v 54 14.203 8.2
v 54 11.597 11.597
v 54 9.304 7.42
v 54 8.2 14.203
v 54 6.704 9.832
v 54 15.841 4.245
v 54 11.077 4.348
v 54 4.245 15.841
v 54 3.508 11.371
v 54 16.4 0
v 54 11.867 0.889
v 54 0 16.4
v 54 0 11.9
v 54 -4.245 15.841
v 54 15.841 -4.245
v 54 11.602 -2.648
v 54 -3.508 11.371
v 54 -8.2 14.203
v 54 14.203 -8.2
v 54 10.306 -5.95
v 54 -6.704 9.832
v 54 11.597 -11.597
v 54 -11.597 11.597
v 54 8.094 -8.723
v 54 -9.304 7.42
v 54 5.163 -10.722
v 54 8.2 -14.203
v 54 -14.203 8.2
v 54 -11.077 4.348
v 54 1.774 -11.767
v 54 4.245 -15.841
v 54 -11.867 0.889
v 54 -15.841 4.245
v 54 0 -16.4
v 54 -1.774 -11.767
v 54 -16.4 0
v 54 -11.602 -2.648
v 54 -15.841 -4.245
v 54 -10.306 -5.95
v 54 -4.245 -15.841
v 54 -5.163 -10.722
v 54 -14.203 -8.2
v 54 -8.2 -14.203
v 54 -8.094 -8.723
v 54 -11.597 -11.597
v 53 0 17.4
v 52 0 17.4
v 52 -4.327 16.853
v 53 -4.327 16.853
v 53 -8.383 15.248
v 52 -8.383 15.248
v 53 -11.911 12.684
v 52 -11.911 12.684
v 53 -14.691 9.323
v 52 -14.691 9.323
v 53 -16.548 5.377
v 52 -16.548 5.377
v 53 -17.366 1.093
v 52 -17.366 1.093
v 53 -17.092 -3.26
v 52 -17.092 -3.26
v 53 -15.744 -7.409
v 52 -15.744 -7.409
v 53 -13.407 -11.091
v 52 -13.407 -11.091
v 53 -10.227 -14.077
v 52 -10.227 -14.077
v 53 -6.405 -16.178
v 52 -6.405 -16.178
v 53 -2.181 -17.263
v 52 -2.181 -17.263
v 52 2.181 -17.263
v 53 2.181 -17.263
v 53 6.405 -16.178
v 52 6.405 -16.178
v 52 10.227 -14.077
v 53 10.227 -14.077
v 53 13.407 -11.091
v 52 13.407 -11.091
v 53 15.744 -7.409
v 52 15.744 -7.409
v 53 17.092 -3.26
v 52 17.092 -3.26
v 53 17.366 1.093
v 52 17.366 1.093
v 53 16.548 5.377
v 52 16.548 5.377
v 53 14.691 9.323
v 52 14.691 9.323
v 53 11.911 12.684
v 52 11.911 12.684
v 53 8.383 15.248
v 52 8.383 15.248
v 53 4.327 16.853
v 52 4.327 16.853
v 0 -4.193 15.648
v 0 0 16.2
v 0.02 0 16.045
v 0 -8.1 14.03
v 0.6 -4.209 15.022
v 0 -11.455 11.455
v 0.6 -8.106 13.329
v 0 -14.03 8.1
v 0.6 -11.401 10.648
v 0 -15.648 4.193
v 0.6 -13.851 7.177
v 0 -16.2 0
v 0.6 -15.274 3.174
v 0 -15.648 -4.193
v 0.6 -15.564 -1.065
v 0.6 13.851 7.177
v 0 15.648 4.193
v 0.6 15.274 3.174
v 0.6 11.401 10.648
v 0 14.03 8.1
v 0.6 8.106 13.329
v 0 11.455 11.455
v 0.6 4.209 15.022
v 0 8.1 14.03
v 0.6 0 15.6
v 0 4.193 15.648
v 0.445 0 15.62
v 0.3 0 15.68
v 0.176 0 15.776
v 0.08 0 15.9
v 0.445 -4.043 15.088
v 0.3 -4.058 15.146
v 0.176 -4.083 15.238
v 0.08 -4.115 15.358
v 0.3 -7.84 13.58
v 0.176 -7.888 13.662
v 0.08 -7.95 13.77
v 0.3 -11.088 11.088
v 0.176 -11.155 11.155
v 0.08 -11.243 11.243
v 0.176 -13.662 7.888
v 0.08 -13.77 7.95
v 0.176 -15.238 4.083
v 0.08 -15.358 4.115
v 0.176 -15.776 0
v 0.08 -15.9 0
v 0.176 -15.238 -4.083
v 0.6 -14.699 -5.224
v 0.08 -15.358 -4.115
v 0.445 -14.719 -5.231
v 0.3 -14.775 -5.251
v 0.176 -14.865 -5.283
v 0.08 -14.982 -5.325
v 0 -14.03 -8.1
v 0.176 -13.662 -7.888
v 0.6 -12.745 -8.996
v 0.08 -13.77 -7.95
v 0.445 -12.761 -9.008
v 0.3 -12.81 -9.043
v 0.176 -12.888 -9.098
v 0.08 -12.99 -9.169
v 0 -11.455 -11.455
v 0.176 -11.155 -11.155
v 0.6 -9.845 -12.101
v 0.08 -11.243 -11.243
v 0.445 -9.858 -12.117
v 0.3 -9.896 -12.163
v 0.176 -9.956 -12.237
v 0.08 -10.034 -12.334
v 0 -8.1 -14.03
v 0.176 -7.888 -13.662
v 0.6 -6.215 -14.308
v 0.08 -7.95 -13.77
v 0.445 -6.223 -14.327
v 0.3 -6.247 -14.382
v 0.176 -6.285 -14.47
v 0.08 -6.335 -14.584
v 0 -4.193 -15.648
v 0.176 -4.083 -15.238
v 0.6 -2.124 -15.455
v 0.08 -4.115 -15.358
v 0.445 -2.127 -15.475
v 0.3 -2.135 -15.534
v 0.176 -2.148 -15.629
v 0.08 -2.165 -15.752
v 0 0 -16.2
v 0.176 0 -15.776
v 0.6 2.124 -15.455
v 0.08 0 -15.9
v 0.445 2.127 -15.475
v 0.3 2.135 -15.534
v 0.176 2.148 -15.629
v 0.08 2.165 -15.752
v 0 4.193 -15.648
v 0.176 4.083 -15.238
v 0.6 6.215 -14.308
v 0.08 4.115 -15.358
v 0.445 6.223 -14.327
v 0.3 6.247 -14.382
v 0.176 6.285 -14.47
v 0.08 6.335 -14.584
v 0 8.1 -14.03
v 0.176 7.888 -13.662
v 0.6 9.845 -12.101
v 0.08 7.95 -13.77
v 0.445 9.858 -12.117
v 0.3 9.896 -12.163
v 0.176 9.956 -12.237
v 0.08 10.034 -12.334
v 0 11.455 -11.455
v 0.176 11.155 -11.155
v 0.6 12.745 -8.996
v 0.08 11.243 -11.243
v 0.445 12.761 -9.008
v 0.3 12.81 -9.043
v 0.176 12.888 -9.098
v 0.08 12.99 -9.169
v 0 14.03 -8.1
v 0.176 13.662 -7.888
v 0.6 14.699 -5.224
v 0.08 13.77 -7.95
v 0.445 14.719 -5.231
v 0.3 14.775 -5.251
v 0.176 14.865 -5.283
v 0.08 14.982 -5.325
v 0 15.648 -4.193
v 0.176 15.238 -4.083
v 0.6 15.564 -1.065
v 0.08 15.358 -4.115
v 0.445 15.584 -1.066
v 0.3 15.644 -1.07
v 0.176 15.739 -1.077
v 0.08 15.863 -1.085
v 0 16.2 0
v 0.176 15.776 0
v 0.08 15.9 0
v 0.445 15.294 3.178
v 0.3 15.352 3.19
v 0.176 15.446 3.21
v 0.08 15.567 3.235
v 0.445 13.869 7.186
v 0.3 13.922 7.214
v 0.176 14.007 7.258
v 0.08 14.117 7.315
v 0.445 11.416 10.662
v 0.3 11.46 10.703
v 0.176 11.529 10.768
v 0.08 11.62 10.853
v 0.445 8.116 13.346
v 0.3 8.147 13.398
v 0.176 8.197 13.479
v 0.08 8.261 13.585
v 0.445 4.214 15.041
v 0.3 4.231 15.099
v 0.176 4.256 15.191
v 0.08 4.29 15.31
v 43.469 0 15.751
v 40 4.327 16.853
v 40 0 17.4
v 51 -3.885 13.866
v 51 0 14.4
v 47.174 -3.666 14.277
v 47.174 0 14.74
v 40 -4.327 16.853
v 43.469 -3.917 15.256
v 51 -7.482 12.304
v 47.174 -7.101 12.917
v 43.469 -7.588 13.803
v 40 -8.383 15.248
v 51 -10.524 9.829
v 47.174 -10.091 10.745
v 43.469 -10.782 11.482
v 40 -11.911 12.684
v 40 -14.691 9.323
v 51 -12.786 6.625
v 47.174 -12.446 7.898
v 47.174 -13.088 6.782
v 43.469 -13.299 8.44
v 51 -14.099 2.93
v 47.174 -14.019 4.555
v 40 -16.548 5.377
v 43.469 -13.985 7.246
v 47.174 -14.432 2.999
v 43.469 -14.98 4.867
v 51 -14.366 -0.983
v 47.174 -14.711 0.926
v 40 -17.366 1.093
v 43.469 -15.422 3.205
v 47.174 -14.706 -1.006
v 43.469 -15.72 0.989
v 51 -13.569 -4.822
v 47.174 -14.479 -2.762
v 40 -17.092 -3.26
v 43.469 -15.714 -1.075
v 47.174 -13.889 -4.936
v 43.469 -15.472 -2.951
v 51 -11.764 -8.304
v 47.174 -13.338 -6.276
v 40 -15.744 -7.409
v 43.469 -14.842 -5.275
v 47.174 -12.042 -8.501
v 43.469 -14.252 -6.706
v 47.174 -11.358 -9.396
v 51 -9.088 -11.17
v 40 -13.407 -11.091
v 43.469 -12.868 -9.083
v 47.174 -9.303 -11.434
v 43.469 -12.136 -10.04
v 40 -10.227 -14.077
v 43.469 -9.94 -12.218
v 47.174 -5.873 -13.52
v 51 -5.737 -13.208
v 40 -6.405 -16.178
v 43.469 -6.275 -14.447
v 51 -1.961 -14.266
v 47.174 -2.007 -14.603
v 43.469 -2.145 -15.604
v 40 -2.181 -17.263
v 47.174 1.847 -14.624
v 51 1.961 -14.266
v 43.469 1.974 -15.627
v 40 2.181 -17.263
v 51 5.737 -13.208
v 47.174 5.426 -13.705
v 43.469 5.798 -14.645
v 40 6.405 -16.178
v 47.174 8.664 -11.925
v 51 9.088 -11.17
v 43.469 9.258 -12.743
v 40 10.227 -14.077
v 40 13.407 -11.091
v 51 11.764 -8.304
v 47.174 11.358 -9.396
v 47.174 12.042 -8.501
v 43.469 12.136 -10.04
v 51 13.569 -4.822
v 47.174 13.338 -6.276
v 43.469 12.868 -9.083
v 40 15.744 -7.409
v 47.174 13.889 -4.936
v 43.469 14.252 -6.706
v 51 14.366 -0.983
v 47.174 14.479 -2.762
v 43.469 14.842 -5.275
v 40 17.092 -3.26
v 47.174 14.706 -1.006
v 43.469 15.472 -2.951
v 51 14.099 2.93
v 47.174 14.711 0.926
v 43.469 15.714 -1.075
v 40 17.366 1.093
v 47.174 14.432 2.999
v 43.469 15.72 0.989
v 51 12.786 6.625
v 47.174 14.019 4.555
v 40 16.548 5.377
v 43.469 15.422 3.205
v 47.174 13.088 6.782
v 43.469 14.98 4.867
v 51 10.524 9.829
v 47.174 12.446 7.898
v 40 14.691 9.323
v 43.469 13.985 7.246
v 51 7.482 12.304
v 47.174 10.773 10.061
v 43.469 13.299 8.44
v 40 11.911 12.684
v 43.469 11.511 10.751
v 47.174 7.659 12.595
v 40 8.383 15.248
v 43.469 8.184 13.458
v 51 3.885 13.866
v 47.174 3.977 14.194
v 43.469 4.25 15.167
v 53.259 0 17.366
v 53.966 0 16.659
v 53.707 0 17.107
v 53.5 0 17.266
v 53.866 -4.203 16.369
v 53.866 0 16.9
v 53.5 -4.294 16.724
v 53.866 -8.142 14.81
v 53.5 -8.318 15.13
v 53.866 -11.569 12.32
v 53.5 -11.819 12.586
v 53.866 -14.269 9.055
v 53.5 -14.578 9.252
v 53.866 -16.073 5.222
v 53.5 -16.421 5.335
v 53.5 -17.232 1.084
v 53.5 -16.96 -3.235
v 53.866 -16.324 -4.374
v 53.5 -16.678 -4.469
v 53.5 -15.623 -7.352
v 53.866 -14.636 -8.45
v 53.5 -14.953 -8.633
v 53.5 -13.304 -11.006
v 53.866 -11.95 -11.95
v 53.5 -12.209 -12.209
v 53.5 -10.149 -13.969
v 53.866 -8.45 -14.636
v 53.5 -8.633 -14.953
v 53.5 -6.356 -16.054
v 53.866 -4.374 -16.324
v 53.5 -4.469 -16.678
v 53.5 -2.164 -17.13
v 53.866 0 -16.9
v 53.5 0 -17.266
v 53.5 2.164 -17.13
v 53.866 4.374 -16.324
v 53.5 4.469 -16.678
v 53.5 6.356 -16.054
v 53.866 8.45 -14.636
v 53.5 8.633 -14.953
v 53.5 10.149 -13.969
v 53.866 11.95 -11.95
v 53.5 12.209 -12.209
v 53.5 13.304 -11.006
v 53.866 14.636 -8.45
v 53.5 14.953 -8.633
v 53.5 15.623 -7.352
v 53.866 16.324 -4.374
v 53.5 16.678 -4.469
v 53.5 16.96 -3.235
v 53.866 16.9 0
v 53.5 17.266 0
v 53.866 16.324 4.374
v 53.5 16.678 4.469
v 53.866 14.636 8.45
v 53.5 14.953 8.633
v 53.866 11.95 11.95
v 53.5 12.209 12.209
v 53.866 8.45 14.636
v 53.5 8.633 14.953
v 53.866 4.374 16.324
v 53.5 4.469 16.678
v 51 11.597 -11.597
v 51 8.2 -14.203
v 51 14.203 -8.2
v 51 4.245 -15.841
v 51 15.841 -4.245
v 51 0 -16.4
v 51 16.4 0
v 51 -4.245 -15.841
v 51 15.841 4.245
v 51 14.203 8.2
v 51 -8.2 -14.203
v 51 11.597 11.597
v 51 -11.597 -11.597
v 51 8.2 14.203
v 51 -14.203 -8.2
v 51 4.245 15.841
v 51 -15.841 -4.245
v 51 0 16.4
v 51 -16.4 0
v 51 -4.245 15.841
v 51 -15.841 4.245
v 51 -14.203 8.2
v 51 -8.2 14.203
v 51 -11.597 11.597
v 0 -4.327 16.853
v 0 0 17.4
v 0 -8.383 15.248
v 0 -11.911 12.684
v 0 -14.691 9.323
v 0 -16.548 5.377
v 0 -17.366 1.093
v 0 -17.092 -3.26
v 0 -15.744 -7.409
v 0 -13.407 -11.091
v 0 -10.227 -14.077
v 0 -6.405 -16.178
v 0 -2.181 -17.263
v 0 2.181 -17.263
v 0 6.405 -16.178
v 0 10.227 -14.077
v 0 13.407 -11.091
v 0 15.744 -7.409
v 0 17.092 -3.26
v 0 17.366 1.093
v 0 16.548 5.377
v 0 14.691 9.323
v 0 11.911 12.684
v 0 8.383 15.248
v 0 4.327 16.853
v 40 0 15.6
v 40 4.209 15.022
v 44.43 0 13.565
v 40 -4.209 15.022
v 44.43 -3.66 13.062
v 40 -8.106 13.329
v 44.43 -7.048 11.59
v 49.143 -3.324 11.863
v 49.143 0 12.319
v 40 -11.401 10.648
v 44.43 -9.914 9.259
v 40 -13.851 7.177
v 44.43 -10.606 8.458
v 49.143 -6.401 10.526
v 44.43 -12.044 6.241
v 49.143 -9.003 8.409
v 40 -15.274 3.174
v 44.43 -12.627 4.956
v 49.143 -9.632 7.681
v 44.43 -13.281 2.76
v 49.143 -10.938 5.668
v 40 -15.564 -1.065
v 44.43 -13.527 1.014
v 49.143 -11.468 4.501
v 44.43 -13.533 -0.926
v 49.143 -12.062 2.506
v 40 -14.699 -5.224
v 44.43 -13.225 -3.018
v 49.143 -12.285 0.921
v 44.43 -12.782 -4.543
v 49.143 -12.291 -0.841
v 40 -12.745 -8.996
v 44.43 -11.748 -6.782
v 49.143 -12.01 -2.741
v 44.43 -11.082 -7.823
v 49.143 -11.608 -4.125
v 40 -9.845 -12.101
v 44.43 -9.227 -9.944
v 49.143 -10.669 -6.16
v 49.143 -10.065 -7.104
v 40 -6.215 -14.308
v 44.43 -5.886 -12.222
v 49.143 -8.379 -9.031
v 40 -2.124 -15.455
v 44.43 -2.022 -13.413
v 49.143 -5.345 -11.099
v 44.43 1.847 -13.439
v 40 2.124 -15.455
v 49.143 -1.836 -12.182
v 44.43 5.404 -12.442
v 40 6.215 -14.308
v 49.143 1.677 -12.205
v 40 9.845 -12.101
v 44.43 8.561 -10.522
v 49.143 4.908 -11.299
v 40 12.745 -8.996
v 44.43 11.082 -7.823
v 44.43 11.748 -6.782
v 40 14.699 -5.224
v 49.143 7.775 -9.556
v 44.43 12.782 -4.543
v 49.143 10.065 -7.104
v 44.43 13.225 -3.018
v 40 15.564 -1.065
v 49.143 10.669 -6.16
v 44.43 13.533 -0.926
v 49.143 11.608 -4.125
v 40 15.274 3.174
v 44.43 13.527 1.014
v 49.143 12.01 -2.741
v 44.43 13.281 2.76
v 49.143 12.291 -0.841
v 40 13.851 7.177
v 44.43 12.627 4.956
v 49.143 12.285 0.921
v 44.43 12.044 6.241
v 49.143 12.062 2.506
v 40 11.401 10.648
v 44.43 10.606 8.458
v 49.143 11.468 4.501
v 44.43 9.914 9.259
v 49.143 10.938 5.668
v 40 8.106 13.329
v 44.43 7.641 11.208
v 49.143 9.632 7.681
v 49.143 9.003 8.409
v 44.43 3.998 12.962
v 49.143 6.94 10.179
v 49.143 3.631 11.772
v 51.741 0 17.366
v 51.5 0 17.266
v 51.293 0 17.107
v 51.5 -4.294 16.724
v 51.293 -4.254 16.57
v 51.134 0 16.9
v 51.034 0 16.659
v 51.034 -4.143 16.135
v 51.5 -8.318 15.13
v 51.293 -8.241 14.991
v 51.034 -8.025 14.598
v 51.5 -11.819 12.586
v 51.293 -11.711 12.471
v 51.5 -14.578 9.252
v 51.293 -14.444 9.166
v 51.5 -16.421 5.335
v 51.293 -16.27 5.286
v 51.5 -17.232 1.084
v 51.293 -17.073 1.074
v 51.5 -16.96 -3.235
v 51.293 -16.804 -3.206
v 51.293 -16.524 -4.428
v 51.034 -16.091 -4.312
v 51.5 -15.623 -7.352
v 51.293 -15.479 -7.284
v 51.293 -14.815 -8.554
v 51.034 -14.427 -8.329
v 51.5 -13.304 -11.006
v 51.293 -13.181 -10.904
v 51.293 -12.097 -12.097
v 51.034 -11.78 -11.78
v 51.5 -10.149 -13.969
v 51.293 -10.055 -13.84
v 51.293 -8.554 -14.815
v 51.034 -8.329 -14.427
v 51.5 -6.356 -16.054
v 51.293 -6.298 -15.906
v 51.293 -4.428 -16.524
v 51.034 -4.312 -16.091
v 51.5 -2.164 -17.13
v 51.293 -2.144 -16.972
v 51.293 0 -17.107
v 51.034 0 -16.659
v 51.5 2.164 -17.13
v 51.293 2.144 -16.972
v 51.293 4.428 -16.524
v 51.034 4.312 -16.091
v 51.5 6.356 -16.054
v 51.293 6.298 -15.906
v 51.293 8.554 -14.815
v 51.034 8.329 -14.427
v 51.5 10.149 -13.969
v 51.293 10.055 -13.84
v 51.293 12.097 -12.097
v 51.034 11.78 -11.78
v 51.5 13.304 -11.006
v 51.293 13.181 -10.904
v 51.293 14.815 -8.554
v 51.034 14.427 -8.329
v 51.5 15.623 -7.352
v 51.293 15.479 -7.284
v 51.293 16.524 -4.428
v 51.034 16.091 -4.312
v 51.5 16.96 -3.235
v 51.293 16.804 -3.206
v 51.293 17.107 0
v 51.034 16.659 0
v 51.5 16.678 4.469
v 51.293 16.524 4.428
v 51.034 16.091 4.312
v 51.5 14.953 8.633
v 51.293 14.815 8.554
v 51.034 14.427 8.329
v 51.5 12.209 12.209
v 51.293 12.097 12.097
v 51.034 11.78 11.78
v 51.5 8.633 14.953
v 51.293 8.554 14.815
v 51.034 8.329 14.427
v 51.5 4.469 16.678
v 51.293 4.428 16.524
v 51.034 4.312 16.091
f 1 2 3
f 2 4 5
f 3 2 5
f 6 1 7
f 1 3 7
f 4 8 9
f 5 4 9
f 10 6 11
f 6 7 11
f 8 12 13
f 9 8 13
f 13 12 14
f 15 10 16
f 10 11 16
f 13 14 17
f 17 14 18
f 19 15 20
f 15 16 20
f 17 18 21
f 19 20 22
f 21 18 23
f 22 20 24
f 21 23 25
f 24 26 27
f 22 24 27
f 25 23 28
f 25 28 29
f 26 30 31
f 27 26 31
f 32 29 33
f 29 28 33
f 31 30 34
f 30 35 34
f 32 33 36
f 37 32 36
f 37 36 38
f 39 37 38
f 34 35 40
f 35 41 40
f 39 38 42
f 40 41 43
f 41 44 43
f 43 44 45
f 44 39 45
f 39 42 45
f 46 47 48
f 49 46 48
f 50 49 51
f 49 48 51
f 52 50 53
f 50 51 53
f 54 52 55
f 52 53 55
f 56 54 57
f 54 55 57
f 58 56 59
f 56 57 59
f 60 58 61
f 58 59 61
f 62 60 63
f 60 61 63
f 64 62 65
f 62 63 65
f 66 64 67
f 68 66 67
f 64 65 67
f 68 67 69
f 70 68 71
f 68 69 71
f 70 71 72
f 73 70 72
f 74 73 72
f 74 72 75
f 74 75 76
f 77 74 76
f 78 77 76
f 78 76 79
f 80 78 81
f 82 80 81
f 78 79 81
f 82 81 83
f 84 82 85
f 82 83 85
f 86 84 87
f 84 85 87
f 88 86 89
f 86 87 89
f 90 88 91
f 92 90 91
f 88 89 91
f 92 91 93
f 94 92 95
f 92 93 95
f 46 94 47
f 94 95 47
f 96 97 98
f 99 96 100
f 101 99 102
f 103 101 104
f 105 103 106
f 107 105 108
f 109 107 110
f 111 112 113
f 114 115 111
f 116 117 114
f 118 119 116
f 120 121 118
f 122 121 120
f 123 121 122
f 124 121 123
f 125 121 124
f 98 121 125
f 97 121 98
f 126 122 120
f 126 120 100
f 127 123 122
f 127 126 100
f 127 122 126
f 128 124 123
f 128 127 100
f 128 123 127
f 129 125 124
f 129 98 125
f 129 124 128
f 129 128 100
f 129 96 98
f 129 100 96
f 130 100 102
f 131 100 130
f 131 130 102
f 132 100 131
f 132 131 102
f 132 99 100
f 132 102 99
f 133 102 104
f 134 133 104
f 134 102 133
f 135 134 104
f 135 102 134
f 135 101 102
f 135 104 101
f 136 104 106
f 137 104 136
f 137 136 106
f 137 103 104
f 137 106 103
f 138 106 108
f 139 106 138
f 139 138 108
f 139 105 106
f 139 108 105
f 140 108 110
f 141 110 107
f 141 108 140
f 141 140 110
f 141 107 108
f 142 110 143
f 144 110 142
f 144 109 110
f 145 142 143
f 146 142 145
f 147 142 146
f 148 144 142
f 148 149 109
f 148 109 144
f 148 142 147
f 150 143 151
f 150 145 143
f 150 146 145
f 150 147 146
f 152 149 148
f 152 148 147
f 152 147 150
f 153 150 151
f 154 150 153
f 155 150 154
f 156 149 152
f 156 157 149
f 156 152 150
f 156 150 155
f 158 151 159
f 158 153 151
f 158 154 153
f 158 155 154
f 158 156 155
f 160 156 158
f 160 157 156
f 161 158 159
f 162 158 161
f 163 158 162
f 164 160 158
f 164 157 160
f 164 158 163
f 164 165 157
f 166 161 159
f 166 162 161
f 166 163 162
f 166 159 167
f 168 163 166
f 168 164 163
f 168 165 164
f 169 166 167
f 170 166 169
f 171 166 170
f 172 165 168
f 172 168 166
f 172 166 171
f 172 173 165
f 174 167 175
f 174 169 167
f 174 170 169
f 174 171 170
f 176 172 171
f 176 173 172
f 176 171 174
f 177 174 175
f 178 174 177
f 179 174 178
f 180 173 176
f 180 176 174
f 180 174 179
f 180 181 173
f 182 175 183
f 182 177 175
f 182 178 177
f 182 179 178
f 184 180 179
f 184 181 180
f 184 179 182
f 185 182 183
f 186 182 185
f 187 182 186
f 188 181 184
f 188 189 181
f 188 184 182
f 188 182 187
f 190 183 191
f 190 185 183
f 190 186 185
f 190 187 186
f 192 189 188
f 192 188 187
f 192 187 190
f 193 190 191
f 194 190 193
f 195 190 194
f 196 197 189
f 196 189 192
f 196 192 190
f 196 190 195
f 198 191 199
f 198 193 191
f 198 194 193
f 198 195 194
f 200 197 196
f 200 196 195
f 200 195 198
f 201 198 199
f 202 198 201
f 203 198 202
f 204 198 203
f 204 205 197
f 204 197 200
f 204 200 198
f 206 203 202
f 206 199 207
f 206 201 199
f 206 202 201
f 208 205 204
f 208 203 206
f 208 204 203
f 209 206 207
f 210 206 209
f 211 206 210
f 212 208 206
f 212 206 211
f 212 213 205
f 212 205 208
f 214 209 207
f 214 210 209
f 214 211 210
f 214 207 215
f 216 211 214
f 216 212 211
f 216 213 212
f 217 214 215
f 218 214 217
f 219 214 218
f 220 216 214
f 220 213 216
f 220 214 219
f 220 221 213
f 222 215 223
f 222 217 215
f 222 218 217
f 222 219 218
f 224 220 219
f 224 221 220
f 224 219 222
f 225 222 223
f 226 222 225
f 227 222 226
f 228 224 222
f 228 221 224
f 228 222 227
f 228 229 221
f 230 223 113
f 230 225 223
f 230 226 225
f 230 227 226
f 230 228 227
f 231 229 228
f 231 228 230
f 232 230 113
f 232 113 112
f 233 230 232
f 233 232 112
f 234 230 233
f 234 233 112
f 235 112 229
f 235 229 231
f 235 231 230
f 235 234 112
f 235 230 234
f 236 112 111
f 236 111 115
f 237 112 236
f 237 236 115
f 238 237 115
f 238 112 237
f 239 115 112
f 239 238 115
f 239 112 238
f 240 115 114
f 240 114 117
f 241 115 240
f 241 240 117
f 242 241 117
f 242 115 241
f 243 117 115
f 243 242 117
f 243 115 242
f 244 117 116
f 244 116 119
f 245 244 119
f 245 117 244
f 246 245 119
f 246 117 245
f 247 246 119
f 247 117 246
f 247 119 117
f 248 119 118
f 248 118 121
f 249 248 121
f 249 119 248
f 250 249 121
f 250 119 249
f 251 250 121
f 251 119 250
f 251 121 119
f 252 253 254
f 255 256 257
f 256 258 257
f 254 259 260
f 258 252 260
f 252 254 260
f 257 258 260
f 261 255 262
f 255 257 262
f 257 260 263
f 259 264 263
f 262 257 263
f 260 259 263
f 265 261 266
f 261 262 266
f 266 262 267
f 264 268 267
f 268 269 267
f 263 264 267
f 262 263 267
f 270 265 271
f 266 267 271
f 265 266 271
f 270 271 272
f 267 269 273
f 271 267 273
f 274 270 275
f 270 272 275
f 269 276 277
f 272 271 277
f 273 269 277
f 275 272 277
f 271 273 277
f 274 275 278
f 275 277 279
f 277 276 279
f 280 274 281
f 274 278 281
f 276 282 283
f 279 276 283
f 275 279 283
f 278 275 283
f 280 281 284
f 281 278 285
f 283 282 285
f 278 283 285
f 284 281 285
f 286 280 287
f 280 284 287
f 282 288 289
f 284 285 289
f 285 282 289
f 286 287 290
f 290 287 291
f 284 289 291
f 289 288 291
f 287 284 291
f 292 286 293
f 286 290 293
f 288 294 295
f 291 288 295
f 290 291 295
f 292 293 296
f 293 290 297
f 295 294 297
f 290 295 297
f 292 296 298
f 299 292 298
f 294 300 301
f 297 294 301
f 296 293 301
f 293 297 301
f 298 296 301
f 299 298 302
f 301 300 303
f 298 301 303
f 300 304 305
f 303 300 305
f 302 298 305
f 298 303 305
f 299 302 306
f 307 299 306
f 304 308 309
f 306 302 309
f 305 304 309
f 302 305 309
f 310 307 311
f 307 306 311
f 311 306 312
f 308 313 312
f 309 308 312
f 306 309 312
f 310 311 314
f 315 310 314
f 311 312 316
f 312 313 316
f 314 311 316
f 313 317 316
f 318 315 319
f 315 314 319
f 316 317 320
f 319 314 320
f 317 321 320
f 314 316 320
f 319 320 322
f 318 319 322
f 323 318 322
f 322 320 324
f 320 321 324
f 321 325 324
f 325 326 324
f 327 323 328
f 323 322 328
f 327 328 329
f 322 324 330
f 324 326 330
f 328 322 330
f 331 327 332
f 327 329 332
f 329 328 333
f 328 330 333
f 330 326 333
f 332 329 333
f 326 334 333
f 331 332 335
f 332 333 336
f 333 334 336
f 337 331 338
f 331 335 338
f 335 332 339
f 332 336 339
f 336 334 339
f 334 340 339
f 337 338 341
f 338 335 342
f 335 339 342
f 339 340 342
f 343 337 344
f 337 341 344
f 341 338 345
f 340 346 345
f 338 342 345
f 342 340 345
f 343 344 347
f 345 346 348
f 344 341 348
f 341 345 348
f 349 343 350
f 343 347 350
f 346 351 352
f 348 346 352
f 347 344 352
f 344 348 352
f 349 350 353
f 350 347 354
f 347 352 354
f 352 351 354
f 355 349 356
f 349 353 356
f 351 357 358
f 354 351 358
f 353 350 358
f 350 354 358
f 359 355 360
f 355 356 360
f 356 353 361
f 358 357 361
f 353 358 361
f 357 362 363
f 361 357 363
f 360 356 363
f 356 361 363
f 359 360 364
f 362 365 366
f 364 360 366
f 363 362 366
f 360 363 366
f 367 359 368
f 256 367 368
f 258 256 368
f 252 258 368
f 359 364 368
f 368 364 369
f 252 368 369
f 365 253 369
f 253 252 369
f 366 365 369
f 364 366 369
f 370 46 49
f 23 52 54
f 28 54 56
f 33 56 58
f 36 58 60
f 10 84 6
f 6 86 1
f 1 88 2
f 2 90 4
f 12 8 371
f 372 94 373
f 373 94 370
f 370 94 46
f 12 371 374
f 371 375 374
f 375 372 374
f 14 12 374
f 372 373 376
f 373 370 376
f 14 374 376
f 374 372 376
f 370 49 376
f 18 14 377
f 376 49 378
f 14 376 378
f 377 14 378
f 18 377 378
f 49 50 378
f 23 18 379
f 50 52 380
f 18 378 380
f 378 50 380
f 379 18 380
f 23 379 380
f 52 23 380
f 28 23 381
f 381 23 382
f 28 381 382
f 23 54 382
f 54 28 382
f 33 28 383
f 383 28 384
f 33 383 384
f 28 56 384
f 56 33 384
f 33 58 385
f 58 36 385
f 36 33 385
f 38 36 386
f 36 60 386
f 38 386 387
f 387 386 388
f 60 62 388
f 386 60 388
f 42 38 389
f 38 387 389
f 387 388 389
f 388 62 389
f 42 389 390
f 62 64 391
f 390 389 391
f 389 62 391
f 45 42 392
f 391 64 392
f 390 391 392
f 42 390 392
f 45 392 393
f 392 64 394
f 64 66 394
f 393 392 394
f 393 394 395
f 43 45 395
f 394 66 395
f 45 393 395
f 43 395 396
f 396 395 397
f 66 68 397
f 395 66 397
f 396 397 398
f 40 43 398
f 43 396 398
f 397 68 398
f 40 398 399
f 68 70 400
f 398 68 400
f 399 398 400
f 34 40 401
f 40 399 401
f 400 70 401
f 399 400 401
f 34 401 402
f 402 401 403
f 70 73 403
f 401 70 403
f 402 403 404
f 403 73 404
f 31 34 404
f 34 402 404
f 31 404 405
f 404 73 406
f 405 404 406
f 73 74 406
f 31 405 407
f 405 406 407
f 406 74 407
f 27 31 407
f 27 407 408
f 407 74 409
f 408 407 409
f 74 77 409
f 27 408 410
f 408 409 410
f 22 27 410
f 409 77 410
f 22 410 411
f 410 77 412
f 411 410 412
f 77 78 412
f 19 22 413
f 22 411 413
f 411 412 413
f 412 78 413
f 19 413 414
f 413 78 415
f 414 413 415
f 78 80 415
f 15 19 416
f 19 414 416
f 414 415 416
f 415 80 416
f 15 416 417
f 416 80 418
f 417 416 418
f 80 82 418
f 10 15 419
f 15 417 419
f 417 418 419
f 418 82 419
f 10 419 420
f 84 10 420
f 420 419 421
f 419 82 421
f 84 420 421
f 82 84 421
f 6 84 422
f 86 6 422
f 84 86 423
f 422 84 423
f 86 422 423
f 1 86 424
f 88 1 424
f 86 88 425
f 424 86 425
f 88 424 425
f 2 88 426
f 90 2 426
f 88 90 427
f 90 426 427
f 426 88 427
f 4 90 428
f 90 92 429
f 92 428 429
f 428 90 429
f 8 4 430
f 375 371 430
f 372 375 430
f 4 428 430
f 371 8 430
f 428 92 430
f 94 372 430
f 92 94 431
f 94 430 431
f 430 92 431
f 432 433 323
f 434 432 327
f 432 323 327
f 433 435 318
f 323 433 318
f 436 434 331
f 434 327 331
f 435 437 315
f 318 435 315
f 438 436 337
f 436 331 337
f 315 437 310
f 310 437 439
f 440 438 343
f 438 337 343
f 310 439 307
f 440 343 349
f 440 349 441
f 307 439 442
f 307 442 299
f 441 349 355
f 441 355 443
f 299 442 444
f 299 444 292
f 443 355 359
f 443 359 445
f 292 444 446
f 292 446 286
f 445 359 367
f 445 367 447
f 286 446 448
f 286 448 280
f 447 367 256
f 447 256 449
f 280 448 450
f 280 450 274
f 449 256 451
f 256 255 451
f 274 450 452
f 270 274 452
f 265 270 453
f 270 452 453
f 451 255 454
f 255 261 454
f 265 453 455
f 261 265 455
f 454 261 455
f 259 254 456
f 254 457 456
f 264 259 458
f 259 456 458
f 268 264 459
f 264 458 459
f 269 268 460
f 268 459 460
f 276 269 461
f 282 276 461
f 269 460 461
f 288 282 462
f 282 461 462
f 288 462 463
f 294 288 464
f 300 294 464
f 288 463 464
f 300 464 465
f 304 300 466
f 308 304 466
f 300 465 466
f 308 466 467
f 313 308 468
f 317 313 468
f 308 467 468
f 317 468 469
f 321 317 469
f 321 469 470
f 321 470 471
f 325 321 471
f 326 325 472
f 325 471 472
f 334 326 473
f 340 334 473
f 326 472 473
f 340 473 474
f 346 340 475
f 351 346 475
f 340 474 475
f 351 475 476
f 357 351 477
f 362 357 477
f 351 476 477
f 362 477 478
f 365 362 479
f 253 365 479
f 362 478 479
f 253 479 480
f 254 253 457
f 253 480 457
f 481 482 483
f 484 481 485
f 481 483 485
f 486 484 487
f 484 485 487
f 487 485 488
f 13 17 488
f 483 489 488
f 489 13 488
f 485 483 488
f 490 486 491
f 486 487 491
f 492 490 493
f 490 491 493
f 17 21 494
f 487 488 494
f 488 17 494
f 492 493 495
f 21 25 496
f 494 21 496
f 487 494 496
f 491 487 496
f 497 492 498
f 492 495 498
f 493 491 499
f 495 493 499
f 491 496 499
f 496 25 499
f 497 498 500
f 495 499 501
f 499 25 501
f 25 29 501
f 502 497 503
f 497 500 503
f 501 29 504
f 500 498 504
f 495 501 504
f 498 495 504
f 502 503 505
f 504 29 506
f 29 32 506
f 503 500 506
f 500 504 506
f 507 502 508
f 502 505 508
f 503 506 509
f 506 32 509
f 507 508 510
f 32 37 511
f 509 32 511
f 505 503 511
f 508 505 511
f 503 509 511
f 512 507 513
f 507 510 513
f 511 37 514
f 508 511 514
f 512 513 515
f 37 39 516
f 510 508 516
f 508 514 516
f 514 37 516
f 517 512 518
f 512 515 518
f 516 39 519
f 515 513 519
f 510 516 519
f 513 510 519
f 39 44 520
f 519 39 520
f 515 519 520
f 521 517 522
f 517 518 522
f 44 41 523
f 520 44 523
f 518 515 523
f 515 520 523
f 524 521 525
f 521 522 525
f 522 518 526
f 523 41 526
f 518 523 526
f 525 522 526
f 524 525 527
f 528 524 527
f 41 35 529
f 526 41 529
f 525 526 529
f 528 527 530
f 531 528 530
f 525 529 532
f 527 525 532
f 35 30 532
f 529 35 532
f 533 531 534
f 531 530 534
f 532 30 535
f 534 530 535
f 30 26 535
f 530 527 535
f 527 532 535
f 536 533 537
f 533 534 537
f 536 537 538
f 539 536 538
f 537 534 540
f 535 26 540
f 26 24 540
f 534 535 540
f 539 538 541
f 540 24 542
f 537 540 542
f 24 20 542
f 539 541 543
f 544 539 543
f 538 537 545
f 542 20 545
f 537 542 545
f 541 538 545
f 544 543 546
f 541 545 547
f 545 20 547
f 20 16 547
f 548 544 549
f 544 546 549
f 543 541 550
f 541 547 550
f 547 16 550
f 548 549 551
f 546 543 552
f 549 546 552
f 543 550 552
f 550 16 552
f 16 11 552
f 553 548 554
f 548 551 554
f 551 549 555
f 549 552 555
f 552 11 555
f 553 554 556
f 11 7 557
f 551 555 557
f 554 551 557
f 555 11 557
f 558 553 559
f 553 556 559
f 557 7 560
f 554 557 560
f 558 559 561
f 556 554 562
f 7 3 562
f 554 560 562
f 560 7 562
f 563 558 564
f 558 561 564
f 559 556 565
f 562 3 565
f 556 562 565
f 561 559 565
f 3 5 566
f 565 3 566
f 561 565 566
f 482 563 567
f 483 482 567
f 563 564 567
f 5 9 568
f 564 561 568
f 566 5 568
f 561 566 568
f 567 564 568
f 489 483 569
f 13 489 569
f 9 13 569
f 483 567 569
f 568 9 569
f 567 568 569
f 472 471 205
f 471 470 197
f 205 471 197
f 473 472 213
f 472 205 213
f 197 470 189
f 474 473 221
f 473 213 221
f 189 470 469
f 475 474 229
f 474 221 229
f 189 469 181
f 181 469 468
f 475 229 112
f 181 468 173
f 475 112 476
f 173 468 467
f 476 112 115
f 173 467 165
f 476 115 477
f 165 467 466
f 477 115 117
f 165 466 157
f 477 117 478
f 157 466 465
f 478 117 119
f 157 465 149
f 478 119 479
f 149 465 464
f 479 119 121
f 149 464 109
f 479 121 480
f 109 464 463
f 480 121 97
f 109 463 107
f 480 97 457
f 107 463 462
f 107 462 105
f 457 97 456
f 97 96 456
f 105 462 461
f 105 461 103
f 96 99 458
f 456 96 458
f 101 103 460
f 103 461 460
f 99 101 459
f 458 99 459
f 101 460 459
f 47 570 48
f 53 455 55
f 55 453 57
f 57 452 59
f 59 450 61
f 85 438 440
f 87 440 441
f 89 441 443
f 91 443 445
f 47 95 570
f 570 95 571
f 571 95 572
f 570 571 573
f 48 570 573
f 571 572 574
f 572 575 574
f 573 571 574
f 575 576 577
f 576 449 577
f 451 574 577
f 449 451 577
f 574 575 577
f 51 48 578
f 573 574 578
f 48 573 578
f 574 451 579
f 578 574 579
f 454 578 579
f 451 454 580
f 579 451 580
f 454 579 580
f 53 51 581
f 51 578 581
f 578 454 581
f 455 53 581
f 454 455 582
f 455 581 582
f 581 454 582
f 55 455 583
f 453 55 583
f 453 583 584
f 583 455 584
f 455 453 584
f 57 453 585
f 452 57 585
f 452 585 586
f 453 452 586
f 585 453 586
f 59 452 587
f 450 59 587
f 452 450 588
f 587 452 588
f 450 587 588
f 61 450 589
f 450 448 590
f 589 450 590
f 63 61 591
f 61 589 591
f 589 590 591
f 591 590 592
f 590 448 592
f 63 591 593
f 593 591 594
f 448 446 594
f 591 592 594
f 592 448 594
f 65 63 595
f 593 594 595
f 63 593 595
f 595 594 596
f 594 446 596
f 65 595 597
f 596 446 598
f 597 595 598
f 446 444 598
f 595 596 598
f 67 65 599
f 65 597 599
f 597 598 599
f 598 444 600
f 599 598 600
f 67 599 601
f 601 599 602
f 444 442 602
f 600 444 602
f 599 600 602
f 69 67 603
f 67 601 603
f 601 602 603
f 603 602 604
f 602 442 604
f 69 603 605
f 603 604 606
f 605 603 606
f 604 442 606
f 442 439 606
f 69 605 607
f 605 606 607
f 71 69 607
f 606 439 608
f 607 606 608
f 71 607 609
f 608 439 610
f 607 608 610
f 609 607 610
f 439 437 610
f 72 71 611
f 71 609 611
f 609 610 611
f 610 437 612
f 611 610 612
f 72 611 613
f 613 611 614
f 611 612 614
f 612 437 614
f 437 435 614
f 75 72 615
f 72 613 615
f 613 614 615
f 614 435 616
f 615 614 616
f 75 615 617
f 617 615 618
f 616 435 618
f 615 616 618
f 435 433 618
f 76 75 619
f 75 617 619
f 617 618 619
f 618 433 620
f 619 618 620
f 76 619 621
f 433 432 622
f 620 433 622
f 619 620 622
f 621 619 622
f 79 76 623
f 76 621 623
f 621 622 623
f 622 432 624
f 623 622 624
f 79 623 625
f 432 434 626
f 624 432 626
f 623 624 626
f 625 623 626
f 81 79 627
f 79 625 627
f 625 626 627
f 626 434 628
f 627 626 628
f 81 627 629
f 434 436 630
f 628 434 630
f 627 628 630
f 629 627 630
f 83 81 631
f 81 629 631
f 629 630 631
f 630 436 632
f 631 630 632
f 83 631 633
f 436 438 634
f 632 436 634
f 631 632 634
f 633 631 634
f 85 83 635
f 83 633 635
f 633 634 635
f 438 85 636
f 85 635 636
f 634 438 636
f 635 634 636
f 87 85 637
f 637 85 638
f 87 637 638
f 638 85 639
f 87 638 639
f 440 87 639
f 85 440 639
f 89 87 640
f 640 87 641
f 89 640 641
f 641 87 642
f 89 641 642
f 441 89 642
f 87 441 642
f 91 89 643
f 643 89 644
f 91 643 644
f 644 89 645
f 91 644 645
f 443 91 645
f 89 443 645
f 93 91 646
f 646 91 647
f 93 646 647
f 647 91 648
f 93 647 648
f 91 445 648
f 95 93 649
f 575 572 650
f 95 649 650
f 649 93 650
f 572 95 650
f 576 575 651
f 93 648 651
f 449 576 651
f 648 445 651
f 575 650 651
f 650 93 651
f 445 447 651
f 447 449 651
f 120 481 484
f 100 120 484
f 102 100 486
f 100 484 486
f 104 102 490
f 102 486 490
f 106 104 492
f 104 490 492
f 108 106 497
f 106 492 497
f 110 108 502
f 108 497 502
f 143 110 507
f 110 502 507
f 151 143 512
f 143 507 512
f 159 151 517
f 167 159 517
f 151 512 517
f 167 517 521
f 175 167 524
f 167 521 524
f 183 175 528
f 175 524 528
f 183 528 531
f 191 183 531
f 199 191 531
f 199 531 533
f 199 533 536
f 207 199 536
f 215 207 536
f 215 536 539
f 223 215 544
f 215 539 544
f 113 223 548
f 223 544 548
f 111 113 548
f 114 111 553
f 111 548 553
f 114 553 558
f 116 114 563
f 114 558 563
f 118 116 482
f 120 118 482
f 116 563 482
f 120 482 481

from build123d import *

# Parameters (mm, degrees)
F2_R = 1
F3_R = 0.6


# Not quite as in the source:
# - a feature names something its author has since deleted; it is built from what else it names


with BuildPart() as f1:
    # F0 (on Front) → F1 (revolve)
    with BuildSketch(Plane.XZ):
        with BuildLine():
            Line((40, 17.4), (11.5, 17.4))
            Line((11.5, 17.4), (0, 17.4))
            Line((0, 17.4), (0, 15.6))
            Line((0, 15.6), (40, 15.6))
            ThreePointArc((40, 15.6), (46.7596616101, 12.8406114977), (54, 11.9))
            Line((54, 11.9), (54, 17.4))
            Line((54, 17.4), (51, 17.4))
            Line((51, 17.4), (51, 14.4))
            ThreePointArc((51, 14.4), (45.2991228745, 15.1634505398), (40, 17.4))
        make_face()
    revolve(axis=Axis((27, 0, 0), (1, 0, 0)))

    # F2
    f2_edges = [f1.edges().sort_by_distance(p)[0] for p in [
        (54, 0, -17.4),
        (51, 0, -17.4),
    ]]
    fillet(f2_edges, radius=F2_R)

    # F3
    f3_edges = [f1.edges().sort_by_distance(p)[0] for p in [
        (0, 0, -15.6),
    ]]
    fillet(f3_edges, radius=F3_R)


solid = f1.part
